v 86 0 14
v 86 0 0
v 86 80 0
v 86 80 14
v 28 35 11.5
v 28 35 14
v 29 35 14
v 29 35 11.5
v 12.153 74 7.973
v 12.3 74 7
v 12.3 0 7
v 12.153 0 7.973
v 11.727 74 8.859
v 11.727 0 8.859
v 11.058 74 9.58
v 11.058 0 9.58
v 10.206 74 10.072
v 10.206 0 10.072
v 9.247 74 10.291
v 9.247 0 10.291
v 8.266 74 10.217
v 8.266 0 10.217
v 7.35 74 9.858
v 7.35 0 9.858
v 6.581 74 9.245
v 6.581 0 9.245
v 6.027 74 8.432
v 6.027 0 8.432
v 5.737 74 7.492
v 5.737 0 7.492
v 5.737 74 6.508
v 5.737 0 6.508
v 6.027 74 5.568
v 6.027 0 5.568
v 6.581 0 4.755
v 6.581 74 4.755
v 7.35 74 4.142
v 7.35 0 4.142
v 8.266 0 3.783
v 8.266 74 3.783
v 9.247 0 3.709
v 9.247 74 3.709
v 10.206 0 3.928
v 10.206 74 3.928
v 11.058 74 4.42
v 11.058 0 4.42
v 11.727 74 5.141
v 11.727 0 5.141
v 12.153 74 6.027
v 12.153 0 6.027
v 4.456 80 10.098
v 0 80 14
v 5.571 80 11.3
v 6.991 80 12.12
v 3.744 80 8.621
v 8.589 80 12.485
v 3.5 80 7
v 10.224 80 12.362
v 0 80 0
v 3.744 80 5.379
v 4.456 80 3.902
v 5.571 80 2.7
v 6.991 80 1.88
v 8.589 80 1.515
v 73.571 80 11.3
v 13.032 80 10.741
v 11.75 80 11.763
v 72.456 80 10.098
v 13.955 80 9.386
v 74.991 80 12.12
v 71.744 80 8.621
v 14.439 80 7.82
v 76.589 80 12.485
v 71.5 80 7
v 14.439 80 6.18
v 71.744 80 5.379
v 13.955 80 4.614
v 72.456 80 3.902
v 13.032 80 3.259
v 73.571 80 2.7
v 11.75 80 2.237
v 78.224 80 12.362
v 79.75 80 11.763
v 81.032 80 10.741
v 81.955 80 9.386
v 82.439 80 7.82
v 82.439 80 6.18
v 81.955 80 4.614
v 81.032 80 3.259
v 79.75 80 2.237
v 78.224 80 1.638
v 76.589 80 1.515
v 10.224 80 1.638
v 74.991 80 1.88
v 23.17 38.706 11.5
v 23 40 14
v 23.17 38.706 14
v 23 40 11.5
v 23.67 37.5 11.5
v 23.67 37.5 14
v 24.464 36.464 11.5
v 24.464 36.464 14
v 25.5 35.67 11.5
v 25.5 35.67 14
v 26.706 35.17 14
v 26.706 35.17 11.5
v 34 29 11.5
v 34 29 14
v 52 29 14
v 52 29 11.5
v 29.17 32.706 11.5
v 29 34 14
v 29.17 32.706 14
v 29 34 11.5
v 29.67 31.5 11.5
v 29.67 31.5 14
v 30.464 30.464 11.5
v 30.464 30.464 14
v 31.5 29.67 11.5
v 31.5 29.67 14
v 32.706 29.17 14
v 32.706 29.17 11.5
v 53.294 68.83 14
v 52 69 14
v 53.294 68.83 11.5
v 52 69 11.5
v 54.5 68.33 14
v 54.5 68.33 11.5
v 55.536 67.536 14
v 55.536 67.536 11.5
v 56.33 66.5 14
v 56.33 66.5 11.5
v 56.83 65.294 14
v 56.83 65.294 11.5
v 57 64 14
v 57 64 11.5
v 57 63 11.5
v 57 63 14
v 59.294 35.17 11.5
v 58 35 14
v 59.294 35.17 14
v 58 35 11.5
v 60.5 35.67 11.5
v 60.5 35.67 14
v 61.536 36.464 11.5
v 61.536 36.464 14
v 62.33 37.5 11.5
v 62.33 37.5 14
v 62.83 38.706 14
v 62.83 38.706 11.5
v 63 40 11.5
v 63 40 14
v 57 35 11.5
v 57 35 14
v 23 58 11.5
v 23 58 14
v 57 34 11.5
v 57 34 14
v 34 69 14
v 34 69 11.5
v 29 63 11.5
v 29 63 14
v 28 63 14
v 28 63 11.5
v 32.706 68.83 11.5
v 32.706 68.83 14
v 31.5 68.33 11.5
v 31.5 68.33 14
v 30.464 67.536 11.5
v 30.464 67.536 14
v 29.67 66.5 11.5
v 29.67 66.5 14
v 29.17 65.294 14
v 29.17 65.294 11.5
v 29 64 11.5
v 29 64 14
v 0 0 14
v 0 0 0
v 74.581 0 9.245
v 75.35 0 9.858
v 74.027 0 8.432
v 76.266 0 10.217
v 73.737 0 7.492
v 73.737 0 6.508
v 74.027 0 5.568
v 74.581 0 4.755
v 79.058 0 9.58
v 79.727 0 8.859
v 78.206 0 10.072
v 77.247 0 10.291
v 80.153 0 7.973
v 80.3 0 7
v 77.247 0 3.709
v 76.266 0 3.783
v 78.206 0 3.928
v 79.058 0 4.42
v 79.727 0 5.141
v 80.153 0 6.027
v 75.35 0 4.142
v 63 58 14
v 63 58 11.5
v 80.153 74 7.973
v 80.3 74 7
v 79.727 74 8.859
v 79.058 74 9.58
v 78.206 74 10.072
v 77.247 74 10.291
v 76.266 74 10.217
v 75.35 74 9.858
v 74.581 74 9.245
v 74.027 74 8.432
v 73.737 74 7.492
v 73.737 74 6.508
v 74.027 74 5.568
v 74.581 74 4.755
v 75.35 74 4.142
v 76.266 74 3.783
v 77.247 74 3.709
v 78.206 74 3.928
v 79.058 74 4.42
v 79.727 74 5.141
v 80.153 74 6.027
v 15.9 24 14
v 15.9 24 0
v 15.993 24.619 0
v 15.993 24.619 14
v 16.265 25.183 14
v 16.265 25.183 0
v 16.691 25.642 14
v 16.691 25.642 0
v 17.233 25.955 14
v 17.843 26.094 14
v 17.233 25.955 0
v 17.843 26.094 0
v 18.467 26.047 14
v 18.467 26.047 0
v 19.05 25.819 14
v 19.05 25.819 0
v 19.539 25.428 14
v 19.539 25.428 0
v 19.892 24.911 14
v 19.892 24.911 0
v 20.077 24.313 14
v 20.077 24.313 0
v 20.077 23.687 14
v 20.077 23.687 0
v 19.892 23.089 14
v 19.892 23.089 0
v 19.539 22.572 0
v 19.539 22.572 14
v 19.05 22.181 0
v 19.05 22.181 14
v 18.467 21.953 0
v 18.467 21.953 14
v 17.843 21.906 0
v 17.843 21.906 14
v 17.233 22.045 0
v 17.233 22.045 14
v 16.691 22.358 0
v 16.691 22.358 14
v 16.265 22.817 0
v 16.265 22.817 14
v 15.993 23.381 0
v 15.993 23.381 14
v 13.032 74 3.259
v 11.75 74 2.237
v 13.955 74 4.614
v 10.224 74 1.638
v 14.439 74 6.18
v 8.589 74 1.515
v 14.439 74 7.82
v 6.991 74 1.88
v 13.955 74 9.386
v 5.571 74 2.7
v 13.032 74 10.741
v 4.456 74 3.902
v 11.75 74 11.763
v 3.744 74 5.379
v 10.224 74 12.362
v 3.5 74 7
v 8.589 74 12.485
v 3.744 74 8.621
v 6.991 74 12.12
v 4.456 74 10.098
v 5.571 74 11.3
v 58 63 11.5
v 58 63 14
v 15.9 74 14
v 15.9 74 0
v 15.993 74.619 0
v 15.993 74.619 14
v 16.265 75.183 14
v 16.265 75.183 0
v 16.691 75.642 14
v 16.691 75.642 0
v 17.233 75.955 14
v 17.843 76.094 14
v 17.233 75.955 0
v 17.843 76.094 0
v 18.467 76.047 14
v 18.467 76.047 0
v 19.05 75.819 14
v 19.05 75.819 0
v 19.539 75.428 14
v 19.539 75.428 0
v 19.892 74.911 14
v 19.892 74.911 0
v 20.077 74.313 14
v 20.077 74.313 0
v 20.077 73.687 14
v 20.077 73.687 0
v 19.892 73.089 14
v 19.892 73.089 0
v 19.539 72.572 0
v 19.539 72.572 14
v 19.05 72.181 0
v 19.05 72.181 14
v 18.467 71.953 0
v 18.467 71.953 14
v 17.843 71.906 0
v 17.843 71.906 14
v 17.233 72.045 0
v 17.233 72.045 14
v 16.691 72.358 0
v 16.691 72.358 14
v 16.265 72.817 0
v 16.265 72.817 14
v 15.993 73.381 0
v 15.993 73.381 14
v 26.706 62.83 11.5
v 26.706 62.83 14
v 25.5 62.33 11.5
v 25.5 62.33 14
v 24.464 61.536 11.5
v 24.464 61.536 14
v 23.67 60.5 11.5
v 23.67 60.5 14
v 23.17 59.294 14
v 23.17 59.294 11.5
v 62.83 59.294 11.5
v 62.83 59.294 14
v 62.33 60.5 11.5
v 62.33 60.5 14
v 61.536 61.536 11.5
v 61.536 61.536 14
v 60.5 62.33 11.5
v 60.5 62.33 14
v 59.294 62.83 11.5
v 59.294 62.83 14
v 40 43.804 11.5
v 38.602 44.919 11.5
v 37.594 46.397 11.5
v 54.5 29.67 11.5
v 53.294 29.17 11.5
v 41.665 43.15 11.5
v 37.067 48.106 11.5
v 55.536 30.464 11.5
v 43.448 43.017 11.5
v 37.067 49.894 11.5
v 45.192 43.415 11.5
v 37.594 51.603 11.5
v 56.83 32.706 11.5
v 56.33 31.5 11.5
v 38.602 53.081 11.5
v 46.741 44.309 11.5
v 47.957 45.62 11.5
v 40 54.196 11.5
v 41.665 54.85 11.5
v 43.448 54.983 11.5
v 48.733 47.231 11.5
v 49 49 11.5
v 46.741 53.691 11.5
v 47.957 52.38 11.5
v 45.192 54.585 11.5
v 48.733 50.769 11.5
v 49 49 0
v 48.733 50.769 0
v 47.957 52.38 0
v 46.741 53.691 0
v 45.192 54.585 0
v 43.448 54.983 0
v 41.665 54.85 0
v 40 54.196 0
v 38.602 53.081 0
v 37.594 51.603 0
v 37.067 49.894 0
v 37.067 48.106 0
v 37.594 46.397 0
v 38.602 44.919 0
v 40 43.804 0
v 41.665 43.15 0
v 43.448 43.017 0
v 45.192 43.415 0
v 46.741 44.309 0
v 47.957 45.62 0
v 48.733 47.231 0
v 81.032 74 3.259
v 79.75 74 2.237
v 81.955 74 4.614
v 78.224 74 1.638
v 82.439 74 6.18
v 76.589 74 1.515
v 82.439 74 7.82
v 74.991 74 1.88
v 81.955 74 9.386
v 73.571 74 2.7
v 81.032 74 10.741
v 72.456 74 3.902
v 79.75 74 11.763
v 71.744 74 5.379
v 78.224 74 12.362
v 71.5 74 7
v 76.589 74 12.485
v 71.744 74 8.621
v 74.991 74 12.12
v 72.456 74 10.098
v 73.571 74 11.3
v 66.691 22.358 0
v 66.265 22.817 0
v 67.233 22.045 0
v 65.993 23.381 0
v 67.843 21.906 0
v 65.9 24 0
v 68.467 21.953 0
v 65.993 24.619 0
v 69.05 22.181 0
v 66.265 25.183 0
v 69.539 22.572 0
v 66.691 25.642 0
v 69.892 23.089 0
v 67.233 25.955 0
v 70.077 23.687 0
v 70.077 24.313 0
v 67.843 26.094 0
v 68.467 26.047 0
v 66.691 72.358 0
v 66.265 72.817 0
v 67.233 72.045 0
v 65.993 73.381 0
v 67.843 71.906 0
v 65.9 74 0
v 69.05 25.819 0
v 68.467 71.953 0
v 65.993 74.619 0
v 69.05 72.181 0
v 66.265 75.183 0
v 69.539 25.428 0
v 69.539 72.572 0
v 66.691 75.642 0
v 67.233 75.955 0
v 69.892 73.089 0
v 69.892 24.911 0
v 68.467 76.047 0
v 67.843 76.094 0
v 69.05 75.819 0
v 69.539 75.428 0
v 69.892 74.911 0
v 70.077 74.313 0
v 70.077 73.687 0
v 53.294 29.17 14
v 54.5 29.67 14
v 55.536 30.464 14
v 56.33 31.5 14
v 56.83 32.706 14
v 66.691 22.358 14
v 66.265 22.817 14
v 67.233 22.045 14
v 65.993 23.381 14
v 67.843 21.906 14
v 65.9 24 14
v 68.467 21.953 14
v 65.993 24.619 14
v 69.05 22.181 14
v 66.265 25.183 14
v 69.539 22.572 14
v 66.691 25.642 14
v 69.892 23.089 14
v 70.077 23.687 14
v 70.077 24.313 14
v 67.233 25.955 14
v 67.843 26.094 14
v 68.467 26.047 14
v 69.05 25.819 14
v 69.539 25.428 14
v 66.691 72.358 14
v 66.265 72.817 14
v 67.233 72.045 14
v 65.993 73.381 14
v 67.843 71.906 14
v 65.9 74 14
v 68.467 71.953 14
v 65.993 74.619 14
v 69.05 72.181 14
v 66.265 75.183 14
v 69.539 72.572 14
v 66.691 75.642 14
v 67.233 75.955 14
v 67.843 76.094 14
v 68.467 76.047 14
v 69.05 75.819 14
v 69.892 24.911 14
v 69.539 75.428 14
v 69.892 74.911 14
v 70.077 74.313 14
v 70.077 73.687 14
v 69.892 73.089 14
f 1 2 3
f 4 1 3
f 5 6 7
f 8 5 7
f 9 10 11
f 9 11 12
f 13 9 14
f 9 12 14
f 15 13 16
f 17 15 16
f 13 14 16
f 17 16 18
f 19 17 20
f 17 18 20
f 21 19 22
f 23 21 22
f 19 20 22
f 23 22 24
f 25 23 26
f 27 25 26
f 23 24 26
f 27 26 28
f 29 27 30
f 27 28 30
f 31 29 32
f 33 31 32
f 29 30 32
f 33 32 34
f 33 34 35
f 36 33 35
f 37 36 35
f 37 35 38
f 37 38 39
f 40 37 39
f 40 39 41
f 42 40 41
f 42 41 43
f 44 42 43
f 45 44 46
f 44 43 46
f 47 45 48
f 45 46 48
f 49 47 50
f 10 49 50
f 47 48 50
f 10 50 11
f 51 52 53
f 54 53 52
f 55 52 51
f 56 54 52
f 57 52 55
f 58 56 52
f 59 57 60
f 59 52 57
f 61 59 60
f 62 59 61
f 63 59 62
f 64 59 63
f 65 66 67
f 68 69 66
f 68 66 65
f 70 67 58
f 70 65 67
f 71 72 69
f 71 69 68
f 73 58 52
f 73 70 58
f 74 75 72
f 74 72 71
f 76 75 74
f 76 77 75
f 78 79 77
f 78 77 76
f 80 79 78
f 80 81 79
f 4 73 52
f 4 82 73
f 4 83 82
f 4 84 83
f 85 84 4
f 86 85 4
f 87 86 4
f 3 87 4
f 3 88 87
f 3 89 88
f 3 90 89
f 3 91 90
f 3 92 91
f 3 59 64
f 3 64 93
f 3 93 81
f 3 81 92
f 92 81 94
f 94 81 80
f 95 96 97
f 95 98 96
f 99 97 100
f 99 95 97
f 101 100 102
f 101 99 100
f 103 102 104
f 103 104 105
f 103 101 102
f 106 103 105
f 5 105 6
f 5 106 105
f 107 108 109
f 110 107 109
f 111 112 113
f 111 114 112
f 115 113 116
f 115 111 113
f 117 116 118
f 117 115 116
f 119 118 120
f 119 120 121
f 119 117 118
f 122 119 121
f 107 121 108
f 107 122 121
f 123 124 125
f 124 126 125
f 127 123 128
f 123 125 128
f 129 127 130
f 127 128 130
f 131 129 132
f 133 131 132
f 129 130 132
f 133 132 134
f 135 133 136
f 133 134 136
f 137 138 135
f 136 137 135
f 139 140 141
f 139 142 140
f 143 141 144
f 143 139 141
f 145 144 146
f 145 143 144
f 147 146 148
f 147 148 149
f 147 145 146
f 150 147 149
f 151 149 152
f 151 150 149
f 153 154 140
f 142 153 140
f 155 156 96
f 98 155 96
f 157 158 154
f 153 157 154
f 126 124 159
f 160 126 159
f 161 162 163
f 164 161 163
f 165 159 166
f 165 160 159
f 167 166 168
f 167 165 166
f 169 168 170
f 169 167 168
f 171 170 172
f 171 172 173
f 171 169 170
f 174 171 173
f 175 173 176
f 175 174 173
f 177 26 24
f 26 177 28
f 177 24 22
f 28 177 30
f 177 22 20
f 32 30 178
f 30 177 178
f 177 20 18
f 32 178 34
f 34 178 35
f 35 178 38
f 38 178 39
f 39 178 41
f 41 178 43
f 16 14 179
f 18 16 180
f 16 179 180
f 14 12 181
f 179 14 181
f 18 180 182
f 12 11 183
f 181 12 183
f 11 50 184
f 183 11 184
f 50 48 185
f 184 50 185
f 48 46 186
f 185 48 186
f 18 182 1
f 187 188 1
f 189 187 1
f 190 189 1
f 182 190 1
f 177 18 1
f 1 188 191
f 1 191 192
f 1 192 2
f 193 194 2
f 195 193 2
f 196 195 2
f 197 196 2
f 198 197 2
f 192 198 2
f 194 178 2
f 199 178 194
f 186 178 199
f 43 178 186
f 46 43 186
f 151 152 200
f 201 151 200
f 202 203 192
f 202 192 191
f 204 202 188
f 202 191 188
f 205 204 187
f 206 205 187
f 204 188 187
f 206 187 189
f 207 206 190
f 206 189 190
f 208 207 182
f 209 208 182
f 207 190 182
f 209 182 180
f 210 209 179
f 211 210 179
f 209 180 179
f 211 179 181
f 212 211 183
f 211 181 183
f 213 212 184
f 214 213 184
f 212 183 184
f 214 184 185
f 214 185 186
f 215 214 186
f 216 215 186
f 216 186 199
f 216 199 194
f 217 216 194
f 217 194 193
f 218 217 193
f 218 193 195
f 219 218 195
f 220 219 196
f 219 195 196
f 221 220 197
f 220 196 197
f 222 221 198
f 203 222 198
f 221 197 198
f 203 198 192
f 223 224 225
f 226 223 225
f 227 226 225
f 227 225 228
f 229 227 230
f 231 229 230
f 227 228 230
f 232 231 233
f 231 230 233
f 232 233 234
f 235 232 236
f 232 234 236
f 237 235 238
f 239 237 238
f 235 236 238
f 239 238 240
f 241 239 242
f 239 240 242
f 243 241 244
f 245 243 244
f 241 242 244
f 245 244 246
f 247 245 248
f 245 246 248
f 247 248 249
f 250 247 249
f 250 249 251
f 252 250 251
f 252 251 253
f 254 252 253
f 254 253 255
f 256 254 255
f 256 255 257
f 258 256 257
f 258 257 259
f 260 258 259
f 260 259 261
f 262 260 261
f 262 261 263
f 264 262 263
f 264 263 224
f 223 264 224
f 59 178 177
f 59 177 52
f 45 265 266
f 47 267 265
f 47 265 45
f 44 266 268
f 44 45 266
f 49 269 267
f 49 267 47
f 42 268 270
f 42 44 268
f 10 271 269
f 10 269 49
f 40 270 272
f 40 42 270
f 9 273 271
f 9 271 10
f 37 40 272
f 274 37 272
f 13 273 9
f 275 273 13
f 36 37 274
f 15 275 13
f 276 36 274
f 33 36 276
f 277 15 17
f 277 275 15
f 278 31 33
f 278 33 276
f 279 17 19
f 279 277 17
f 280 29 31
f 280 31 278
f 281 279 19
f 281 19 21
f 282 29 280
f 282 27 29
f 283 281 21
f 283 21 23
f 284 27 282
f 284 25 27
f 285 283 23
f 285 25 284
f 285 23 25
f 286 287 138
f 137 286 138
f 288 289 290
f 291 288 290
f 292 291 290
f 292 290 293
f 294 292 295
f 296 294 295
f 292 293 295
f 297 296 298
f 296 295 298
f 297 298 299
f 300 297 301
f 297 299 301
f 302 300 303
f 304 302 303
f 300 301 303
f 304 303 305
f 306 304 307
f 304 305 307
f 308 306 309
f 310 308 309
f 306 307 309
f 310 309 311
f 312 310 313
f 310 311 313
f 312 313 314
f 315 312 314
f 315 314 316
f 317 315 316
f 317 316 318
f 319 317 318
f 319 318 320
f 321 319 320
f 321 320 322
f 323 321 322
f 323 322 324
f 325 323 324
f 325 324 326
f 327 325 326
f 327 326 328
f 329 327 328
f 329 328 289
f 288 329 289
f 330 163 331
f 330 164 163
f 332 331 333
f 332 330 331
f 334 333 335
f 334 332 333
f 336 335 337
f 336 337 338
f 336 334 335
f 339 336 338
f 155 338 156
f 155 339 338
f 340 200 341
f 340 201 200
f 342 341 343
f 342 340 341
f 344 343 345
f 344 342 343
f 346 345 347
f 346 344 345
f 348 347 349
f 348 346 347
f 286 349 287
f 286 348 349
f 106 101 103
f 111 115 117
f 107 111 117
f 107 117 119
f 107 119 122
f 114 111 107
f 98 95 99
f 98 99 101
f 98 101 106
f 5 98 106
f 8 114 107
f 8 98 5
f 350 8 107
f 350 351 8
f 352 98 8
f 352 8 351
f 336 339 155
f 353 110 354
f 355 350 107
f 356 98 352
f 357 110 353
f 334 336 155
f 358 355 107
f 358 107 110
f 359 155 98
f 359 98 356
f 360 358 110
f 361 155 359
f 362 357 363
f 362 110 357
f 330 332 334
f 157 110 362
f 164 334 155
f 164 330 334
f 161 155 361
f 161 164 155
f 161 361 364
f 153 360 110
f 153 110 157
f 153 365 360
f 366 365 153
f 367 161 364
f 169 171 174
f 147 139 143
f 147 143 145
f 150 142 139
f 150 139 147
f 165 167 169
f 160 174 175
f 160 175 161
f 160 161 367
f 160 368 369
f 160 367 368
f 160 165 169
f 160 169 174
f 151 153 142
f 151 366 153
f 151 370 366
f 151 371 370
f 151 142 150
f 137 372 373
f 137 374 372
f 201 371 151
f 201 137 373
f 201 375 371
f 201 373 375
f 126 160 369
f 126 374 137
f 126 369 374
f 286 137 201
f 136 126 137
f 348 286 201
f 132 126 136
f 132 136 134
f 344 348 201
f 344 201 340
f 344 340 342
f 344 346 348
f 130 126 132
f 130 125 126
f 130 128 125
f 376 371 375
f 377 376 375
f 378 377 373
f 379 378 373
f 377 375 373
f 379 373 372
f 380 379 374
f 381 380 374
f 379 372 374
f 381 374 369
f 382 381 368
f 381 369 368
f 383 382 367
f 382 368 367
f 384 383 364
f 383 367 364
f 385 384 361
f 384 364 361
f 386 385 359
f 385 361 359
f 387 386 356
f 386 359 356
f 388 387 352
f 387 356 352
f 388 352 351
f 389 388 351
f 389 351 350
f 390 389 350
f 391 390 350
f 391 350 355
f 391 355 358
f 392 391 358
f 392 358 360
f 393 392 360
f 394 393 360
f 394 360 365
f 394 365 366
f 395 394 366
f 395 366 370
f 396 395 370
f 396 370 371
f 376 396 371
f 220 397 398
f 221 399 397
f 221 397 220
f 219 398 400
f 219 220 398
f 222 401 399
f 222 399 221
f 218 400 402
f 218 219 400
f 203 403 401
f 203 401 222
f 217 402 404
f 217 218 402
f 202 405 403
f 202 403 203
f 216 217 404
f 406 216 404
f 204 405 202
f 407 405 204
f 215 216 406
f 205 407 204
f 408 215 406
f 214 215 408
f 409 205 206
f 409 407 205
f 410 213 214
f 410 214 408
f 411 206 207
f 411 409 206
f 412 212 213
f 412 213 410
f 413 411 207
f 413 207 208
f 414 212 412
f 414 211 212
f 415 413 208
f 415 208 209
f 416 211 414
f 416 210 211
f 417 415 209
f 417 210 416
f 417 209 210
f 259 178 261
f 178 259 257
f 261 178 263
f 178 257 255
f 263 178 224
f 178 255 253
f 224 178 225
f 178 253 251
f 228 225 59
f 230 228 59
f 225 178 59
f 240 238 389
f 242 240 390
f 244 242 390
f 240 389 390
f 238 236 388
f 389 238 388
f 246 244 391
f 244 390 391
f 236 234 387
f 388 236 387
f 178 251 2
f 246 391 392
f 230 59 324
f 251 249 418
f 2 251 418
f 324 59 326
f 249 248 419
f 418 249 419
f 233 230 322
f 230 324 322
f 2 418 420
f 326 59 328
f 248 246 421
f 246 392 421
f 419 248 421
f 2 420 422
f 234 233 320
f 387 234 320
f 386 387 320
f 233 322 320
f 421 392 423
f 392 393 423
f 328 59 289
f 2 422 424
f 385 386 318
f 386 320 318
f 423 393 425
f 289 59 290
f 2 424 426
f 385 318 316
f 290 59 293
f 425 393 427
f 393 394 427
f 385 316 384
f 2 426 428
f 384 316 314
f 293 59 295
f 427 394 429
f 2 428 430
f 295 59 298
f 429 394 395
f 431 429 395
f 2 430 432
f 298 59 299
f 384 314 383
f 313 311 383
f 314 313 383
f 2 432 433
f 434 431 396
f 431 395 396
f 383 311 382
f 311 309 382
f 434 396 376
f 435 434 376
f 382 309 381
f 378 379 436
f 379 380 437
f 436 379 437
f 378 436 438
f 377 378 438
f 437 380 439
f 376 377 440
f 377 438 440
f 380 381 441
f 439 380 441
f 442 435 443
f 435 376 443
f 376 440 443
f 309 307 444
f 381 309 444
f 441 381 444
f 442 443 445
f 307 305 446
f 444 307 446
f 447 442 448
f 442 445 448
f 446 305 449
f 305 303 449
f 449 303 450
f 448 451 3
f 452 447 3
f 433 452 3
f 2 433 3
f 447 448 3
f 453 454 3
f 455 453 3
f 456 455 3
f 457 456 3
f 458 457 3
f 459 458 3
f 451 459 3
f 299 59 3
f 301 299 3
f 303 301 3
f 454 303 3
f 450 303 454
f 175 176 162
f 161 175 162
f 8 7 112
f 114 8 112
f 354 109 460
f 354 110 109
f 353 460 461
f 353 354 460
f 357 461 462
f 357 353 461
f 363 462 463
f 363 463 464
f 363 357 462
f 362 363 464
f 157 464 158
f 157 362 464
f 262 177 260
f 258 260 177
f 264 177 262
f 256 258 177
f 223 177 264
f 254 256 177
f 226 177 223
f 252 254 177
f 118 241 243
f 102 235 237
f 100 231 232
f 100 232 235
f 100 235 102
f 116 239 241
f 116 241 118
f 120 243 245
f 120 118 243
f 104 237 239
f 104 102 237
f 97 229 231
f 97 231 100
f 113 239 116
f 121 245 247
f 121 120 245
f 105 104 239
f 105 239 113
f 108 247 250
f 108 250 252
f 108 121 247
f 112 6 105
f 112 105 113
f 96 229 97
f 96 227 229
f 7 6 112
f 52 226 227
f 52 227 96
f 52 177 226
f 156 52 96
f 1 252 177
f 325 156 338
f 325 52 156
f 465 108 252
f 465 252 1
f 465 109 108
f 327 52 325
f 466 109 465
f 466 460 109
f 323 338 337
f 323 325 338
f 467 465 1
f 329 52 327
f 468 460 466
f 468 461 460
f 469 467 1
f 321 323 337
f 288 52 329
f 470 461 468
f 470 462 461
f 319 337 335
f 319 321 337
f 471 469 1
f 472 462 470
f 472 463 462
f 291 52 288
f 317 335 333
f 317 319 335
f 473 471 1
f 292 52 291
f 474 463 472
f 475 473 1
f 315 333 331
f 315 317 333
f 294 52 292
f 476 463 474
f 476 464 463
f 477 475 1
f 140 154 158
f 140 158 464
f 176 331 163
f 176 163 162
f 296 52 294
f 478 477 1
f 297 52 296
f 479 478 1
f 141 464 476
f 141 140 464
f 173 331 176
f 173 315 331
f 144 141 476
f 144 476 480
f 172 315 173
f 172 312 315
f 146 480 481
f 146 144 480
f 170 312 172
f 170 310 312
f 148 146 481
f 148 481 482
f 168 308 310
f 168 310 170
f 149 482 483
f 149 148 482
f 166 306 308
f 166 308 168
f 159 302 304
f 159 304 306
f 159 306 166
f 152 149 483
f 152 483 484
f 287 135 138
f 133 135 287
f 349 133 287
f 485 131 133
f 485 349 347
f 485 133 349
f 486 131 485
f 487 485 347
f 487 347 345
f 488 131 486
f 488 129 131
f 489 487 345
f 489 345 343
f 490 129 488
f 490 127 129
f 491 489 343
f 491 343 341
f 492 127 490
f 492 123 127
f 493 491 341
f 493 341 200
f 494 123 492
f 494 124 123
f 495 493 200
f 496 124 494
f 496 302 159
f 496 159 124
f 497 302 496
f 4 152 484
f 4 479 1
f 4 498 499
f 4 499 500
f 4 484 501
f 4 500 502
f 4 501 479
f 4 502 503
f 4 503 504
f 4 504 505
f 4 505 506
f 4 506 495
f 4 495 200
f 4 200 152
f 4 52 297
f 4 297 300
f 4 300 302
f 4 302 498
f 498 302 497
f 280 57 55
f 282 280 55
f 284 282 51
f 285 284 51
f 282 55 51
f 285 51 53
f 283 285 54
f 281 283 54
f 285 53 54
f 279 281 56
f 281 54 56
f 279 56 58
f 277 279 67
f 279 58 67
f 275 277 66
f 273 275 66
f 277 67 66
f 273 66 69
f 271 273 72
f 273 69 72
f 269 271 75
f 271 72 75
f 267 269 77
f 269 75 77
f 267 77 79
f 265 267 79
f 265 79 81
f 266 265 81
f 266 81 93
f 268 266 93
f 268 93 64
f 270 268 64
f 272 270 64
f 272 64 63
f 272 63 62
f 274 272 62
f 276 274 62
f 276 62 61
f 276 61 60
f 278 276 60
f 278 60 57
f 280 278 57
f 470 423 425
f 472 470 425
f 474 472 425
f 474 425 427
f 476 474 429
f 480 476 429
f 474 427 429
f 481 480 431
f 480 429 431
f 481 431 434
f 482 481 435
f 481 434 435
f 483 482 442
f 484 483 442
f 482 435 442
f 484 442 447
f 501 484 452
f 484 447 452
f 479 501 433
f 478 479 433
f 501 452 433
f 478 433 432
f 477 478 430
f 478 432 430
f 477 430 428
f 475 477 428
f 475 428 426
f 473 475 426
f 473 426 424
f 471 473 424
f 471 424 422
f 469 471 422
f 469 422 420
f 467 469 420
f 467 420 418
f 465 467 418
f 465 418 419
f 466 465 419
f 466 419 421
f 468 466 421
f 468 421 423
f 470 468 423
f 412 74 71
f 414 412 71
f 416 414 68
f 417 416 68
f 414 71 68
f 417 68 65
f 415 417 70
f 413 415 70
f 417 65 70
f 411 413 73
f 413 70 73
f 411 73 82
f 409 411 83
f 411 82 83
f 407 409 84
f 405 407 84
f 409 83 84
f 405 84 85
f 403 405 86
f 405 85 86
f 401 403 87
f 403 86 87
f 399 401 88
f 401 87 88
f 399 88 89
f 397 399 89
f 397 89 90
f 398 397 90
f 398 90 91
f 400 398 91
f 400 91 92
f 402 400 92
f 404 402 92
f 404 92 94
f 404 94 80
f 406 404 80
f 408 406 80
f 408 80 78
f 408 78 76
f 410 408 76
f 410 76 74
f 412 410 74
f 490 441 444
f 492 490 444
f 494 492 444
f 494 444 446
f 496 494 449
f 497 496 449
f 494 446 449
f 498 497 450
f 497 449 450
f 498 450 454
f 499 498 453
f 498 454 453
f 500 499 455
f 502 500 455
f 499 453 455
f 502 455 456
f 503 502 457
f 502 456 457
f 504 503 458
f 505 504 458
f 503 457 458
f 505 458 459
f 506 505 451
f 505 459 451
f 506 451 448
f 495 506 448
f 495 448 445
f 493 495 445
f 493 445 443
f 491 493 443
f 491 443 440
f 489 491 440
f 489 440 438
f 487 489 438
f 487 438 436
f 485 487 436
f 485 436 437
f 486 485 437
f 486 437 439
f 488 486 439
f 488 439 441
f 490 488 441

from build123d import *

# Parameters (mm, degrees)
SKETCH_1_W                   = 86
SKETCH_1_H                   = 80
EXTRUDE_1_DEPTH              = 14
SKETCH_2_R                   = 6
CUT_EXTRUDE_1_DEPTH          = 119.287784661
CUT_EXTRUDE_2_DEPTH          = 2.5
FILLET_1_R                   = 5
HOLE_WIZARD_M6_1_D           = 6.6
HOLE_WIZARD_M6_1_CBORE_D     = 11
HOLE_WIZARD_M6_1_CBORE_DEPTH = 6
HOLE_WIZARD_M5_1_D           = 4.2


with BuildPart() as part:
    # 草图1 → 凸台-拉伸1 (new body)
    with BuildSketch(Plane.XY):
        with Locations((43, 40)):
            Rectangle(SKETCH_1_W, SKETCH_1_H)
    extrude(amount=EXTRUDE_1_DEPTH)

    # 草图2 → 切除-拉伸1 (cut, through all)
    with BuildSketch(Plane.XY.offset(14)):
        with Locations((43, 49)):
            Circle(SKETCH_2_R)
    extrude(amount=-CUT_EXTRUDE_1_DEPTH, mode=Mode.SUBTRACT)

    # 草图3 → 切除-拉伸2 (cut)
    with BuildSketch(Plane.XY.offset(14)):
        Polygon((57, 69), (29, 69), (29, 63), (23, 63), (23, 35), (29, 35), (29, 29), (57, 29), (57, 35), (63, 35), (63, 63), (57, 63), align=None)
    extrude(amount=-CUT_EXTRUDE_2_DEPTH, mode=Mode.SUBTRACT)

    # 圆角1
    fillet_1_edges = [part.edges().sort_by_distance(p)[0] for p in [
        (29, 69, 12.75),
        (57, 69, 12.75),
        (63, 63, 12.75),
        (63, 35, 12.75),
        (57, 29, 12.75),
        (29, 29, 12.75),
        (23, 35, 12.75),
        (23, 63, 12.75),
    ]]
    fillet(fillet_1_edges, radius=FILLET_1_R)

    # M6 六角凹头螺钉的柱形沉头孔1 (through all)
    with Locations(Plane(origin=(0, 80, 0), x_dir=(-1, 0, 0), z_dir=(0, 1, 0))):
        with Locations((-9, 7), (-77, 7)):
            CounterBoreHole(HOLE_WIZARD_M6_1_D / 2, HOLE_WIZARD_M6_1_CBORE_D / 2, HOLE_WIZARD_M6_1_CBORE_DEPTH)

    # M5 螺纹孔1 (through all)
    with Locations(Plane.XY.offset(14)):
        with Locations((68, 74), (18, 74), (18, 24), (68, 24)):
            Hole(HOLE_WIZARD_M5_1_D / 2)


solid = part.part
